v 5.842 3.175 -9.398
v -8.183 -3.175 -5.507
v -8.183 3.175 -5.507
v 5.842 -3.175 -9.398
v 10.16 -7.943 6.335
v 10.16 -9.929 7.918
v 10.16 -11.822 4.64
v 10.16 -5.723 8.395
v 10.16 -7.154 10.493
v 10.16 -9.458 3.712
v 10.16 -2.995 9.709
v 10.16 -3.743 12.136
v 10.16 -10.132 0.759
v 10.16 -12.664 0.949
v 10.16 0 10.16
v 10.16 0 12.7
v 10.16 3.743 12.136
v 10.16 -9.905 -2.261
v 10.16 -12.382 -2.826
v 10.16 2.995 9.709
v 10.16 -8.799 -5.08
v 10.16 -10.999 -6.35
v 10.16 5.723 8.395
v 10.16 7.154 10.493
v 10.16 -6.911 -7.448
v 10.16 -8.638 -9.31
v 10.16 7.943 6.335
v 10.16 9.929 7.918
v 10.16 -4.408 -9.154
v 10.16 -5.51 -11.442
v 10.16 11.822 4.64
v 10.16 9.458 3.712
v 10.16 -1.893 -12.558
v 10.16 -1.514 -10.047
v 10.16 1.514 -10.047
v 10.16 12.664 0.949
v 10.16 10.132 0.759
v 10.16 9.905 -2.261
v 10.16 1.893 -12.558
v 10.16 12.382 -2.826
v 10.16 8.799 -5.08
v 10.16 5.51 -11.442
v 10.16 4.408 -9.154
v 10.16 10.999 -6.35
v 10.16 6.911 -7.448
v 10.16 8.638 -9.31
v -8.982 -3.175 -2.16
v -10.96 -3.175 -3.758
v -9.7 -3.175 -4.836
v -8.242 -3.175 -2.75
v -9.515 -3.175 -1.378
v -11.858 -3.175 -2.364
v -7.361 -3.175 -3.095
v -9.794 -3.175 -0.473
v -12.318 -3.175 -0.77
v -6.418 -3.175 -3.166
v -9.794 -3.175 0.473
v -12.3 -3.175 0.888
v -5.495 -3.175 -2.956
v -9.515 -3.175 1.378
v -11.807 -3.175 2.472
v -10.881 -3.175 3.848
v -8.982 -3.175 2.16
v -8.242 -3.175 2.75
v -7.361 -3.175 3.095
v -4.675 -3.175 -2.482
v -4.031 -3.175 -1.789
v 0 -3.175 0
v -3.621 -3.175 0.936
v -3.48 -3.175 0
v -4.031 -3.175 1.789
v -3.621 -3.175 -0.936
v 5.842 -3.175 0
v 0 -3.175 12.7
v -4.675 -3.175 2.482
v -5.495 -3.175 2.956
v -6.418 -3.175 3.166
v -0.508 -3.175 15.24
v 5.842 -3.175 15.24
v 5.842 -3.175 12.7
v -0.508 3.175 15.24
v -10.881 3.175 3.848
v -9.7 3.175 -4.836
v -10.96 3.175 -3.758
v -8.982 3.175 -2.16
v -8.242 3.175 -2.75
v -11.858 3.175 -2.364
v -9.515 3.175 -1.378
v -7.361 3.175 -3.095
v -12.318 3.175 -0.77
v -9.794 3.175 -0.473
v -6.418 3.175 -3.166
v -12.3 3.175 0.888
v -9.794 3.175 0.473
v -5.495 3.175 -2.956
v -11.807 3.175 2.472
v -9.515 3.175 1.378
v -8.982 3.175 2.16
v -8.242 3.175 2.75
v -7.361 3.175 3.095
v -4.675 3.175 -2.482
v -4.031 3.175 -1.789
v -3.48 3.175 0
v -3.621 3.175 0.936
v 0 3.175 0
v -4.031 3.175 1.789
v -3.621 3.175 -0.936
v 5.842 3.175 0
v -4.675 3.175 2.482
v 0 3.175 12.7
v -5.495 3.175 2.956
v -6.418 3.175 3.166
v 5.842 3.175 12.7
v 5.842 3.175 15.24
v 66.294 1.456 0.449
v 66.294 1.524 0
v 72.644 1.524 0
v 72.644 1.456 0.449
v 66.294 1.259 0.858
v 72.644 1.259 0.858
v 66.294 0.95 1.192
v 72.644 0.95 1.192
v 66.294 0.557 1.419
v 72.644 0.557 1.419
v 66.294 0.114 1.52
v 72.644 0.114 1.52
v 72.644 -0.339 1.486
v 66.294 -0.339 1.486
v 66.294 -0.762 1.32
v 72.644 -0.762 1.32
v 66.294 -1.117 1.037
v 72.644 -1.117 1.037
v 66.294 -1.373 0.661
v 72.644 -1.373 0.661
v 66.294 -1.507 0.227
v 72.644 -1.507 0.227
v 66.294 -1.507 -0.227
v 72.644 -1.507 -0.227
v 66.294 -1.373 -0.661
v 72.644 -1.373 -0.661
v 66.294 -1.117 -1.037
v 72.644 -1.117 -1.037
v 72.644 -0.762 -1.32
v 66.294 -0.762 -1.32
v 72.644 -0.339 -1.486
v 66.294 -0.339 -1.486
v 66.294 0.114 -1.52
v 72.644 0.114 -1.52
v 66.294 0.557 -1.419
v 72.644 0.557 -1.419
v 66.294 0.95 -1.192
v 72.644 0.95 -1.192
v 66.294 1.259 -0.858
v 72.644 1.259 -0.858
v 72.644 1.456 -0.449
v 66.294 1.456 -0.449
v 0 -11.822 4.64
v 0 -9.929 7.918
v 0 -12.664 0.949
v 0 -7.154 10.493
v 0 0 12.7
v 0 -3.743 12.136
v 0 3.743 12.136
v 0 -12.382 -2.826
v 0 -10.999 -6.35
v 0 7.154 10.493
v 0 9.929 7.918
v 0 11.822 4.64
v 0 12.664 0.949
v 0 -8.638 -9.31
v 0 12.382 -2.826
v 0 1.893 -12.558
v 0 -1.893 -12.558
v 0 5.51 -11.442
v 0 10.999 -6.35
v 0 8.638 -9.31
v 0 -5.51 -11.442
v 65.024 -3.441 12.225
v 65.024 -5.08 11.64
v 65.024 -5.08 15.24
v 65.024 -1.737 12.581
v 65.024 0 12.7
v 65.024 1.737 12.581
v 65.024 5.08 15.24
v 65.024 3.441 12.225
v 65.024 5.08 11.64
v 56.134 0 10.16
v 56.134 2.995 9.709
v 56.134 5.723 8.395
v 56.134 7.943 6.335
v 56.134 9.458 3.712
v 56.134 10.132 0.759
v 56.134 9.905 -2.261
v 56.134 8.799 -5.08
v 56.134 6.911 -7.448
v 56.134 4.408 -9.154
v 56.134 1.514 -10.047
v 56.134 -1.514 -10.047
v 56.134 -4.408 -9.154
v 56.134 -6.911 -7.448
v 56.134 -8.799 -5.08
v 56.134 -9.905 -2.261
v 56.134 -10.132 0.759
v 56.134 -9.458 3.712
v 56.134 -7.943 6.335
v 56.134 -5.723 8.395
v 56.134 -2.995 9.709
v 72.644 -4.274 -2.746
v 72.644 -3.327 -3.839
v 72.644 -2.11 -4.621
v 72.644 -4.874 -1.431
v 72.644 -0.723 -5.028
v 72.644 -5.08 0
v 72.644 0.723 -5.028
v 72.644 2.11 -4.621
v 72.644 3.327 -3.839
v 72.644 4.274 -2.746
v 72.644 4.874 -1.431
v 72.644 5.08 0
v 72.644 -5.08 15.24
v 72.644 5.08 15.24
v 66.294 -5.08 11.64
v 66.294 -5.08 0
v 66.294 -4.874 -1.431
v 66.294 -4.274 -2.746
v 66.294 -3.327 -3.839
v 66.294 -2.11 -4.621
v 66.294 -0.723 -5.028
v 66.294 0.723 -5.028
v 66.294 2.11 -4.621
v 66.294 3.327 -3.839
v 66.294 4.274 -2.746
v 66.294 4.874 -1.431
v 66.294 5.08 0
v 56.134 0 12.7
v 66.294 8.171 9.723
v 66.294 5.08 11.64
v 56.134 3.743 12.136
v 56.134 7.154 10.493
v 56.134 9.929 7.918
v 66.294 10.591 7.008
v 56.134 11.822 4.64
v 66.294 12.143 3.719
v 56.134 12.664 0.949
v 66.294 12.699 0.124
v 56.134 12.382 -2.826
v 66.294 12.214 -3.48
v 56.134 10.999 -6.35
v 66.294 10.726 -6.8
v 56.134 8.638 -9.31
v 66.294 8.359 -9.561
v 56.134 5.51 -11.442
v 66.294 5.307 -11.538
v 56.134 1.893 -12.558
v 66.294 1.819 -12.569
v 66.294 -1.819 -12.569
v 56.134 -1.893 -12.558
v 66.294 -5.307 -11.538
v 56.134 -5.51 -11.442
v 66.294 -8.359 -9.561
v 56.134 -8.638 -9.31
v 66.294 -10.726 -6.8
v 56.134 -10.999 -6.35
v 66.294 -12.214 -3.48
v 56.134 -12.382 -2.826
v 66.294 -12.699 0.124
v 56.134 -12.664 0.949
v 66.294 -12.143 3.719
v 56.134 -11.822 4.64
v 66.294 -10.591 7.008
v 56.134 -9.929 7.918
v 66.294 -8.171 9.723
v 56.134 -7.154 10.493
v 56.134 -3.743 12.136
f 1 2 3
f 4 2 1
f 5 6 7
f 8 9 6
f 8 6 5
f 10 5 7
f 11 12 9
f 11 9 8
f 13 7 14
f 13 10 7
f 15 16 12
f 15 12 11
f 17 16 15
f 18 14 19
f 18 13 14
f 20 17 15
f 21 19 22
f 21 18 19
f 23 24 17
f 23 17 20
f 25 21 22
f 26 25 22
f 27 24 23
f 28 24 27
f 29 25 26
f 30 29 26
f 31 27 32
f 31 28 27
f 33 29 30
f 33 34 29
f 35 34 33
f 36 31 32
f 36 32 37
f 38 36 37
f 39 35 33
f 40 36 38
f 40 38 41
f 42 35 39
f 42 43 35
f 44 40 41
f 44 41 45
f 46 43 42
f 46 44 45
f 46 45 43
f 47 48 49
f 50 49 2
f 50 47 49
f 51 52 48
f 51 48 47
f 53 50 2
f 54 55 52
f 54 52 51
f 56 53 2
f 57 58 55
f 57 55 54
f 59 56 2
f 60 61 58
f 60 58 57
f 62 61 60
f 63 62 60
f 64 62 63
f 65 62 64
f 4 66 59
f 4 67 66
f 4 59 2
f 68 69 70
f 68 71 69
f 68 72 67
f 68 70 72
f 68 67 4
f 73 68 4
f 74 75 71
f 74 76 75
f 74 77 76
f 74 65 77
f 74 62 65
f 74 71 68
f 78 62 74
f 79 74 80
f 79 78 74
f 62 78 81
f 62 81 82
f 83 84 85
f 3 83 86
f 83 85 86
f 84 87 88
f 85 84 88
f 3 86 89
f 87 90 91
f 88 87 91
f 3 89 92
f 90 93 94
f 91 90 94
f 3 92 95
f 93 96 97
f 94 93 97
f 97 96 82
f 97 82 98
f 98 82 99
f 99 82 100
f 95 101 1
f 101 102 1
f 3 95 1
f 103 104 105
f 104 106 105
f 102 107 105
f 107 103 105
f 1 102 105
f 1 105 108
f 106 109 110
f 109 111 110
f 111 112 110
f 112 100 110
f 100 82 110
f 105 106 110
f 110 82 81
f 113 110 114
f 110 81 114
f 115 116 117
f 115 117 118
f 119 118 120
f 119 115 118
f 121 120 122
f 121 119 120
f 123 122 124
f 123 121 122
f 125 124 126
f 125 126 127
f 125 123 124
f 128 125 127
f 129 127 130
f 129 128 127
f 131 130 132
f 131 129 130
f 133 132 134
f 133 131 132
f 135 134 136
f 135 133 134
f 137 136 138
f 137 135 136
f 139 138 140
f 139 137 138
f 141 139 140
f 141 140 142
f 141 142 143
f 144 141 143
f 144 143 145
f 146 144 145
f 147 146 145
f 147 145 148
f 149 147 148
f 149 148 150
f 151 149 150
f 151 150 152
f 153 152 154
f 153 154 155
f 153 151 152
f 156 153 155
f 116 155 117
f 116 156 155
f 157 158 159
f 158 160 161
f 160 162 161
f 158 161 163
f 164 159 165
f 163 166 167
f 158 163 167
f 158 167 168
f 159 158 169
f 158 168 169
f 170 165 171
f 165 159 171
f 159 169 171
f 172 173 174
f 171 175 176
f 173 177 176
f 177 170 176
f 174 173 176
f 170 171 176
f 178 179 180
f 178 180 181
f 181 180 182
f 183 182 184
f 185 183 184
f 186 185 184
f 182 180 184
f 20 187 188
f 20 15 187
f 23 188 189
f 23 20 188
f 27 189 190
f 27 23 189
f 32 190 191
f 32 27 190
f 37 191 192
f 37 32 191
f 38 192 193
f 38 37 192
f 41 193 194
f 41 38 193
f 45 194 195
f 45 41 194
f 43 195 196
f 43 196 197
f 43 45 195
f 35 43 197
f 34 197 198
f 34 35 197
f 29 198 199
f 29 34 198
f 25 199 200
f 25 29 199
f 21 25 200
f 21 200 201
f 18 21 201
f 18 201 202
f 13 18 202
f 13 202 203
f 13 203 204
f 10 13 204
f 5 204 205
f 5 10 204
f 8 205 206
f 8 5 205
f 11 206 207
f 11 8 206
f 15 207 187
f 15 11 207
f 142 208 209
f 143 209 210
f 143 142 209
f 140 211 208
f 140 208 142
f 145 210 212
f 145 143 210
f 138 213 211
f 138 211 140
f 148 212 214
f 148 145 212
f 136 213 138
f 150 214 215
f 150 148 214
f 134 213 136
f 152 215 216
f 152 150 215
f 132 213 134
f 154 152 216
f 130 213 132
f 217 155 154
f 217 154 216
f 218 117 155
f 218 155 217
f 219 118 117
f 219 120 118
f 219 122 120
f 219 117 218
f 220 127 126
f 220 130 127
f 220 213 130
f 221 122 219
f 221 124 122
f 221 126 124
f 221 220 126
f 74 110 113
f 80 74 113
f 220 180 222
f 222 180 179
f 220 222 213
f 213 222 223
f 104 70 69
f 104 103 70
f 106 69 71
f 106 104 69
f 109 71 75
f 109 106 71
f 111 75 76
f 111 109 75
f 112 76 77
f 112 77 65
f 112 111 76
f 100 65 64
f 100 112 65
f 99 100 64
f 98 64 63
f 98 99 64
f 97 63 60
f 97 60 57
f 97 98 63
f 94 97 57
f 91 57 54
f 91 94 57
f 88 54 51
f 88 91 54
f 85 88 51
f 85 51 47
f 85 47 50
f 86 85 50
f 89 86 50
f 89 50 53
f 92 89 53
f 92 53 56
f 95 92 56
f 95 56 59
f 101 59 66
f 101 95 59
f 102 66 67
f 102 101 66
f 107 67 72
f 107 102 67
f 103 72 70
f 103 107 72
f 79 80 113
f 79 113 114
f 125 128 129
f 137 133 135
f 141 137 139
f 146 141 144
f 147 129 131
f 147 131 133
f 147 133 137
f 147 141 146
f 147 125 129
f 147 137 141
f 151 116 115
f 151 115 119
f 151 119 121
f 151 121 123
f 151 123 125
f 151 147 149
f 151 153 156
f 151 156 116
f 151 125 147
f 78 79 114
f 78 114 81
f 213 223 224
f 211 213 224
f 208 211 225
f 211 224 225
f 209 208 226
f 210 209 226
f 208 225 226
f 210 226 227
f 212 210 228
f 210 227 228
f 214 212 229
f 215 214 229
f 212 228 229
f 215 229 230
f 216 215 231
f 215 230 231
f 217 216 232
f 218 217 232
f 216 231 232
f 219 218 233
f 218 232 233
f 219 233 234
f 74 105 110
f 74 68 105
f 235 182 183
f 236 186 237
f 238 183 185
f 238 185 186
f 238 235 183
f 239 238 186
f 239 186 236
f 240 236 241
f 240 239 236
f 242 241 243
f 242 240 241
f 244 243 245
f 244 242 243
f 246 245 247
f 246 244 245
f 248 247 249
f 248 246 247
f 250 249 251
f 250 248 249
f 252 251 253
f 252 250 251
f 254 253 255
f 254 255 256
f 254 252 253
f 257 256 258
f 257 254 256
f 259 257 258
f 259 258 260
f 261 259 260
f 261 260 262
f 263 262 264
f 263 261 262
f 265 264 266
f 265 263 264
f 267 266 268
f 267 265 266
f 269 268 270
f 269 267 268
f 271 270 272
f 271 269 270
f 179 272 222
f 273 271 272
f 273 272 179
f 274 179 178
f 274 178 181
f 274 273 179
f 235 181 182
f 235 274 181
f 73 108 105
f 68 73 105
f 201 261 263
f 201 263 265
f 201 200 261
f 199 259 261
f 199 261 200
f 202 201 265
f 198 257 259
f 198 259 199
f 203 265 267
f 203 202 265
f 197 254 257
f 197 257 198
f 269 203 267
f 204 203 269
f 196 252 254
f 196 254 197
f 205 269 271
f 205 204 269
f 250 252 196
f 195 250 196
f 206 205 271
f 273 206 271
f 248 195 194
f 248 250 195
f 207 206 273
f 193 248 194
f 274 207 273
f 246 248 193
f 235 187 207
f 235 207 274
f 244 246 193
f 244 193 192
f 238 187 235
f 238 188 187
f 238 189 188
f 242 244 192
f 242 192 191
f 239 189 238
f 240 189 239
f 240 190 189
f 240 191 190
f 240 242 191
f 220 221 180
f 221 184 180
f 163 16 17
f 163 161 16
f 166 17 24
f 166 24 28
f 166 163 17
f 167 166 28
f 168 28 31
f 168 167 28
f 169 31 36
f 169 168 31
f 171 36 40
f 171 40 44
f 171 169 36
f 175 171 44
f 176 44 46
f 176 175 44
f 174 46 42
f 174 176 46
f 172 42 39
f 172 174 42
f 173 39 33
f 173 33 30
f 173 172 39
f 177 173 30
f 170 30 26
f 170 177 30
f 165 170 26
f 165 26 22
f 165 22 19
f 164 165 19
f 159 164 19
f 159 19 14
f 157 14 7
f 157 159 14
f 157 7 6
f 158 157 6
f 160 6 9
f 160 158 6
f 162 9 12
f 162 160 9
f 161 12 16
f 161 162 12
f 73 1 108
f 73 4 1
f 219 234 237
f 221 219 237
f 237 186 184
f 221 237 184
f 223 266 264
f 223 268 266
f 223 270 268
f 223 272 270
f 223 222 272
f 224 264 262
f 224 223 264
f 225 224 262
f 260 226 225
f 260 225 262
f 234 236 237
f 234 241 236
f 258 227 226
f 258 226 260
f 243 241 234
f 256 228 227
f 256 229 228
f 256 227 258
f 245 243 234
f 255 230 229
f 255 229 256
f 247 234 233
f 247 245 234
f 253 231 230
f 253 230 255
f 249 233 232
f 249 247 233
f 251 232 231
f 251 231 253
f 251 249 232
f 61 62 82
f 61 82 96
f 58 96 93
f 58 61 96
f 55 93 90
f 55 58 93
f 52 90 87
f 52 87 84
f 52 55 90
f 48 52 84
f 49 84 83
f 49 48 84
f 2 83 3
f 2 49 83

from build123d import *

# Parameters (mm, degrees)
F0_W          = 5.842
F0_H          = 12.7
F0_R          = 3.175
F2_DEPTH      = 3.175
F3_R          = 1.524
F4_DEPTH      = 1.27
F4_DEPTH_BACK = 6.35


with BuildPart() as f1:
    # F0 (on Front) → F1 (revolve)
    with BuildSketch(Plane.XZ):
        with Locations((2.921, 6.35)):
            Rectangle(F0_W, F0_H)
        Polygon((5.842, 12.7), (5.842, 0), (66.294, 0), (66.294, 12.7), (56.134, 12.7), (56.134, 10.16), (10.16, 10.16), (10.16, 12.7), align=None)
    revolve(axis=Axis((33.147, 0, 0), (-1, 0, 0)))

    # F3 (on face) → F4 (join, two sides)
    with BuildSketch(Plane.YZ.offset(66.294)) as f4_sk:
        with BuildLine():
            ThreePointArc((-5.08, 0), (0, -5.08), (5.08, 0))
            ThreePointArc((5.08, 0), (0, 5.08), (-5.08, 0))
        make_face()
        Circle(F3_R, mode=Mode.SUBTRACT)
        with BuildLine():
            ThreePointArc((-5.08, 0), (0, 5.08), (5.08, 0))
            Line((5.08, 0), (5.08, 11.6397422652))
            ThreePointArc((5.08, 11.6397422652), (0, 12.7), (-5.08, 11.6397422652))
            Line((-5.08, 11.6397422652), (-5.08, 0))
        make_face()
        with BuildLine():
            ThreePointArc((-5.08, 11.6397422652), (0, 12.7), (5.08, 11.6397422652))
            Line((5.08, 11.6397422652), (5.08, 15.24))
            Line((5.08, 15.24), (-5.08, 15.24))
            Line((-5.08, 15.24), (-5.08, 11.6397422652))
        make_face()
    extrude(amount=-F4_DEPTH)
    extrude(f4_sk.sketch, amount=F4_DEPTH_BACK)


with BuildPart() as f2:
    # F0 (on Front) → F2 (new body, symmetric)
    with BuildSketch(Plane.XZ):
        with BuildLine():
            Line((-0.9398, 0), (0, 0))
            Line((0, 0), (0, 12.7))
            Line((0, 12.7), (5.842, 12.7))
            Line((5.842, 12.7), (5.842, 15.24))
            Line((5.842, 15.24), (-0.508, 15.24))
            Line((-0.508, 15.24), (-10.8806298187, 3.8475430269))
            ThreePointArc((-10.8806298187, 3.8475430269), (-4.5919612295, 5.3297205562), (-0.9398, 0))
        make_face()
        with BuildLine():
            ThreePointArc((-8.1826630726, -5.5069827884), (-3.1957909266, -4.5493385486), (-0.9398, 0))
            ThreePointArc((-0.9398, 0), (-4.5919612295, 5.3297205562), (-10.8806298187, 3.8475430269))
            ThreePointArc((-10.8806298187, 3.8475430269), (-12.1459778134, -1.5837270034), (-8.1826630726, -5.5069827884))
        make_face()
        with Locations((-6.6548, 0)):
            Circle(F0_R, mode=Mode.SUBTRACT)
        with BuildLine():
            Line((5.842, 0), (0, 0))
            Line((0, 0), (-0.9398, 0))
            ThreePointArc((-0.9398, 0), (-3.1957909266, -4.5493385486), (-8.1826630726, -5.5069827884))
            Line((-8.1826630726, -5.5069827884), (5.842, -9.398))
            Line((5.842, -9.398), (5.842, 0))
        make_face()
    extrude(amount=F2_DEPTH, both=True)


solid = Compound([f1.part, f2.part])
